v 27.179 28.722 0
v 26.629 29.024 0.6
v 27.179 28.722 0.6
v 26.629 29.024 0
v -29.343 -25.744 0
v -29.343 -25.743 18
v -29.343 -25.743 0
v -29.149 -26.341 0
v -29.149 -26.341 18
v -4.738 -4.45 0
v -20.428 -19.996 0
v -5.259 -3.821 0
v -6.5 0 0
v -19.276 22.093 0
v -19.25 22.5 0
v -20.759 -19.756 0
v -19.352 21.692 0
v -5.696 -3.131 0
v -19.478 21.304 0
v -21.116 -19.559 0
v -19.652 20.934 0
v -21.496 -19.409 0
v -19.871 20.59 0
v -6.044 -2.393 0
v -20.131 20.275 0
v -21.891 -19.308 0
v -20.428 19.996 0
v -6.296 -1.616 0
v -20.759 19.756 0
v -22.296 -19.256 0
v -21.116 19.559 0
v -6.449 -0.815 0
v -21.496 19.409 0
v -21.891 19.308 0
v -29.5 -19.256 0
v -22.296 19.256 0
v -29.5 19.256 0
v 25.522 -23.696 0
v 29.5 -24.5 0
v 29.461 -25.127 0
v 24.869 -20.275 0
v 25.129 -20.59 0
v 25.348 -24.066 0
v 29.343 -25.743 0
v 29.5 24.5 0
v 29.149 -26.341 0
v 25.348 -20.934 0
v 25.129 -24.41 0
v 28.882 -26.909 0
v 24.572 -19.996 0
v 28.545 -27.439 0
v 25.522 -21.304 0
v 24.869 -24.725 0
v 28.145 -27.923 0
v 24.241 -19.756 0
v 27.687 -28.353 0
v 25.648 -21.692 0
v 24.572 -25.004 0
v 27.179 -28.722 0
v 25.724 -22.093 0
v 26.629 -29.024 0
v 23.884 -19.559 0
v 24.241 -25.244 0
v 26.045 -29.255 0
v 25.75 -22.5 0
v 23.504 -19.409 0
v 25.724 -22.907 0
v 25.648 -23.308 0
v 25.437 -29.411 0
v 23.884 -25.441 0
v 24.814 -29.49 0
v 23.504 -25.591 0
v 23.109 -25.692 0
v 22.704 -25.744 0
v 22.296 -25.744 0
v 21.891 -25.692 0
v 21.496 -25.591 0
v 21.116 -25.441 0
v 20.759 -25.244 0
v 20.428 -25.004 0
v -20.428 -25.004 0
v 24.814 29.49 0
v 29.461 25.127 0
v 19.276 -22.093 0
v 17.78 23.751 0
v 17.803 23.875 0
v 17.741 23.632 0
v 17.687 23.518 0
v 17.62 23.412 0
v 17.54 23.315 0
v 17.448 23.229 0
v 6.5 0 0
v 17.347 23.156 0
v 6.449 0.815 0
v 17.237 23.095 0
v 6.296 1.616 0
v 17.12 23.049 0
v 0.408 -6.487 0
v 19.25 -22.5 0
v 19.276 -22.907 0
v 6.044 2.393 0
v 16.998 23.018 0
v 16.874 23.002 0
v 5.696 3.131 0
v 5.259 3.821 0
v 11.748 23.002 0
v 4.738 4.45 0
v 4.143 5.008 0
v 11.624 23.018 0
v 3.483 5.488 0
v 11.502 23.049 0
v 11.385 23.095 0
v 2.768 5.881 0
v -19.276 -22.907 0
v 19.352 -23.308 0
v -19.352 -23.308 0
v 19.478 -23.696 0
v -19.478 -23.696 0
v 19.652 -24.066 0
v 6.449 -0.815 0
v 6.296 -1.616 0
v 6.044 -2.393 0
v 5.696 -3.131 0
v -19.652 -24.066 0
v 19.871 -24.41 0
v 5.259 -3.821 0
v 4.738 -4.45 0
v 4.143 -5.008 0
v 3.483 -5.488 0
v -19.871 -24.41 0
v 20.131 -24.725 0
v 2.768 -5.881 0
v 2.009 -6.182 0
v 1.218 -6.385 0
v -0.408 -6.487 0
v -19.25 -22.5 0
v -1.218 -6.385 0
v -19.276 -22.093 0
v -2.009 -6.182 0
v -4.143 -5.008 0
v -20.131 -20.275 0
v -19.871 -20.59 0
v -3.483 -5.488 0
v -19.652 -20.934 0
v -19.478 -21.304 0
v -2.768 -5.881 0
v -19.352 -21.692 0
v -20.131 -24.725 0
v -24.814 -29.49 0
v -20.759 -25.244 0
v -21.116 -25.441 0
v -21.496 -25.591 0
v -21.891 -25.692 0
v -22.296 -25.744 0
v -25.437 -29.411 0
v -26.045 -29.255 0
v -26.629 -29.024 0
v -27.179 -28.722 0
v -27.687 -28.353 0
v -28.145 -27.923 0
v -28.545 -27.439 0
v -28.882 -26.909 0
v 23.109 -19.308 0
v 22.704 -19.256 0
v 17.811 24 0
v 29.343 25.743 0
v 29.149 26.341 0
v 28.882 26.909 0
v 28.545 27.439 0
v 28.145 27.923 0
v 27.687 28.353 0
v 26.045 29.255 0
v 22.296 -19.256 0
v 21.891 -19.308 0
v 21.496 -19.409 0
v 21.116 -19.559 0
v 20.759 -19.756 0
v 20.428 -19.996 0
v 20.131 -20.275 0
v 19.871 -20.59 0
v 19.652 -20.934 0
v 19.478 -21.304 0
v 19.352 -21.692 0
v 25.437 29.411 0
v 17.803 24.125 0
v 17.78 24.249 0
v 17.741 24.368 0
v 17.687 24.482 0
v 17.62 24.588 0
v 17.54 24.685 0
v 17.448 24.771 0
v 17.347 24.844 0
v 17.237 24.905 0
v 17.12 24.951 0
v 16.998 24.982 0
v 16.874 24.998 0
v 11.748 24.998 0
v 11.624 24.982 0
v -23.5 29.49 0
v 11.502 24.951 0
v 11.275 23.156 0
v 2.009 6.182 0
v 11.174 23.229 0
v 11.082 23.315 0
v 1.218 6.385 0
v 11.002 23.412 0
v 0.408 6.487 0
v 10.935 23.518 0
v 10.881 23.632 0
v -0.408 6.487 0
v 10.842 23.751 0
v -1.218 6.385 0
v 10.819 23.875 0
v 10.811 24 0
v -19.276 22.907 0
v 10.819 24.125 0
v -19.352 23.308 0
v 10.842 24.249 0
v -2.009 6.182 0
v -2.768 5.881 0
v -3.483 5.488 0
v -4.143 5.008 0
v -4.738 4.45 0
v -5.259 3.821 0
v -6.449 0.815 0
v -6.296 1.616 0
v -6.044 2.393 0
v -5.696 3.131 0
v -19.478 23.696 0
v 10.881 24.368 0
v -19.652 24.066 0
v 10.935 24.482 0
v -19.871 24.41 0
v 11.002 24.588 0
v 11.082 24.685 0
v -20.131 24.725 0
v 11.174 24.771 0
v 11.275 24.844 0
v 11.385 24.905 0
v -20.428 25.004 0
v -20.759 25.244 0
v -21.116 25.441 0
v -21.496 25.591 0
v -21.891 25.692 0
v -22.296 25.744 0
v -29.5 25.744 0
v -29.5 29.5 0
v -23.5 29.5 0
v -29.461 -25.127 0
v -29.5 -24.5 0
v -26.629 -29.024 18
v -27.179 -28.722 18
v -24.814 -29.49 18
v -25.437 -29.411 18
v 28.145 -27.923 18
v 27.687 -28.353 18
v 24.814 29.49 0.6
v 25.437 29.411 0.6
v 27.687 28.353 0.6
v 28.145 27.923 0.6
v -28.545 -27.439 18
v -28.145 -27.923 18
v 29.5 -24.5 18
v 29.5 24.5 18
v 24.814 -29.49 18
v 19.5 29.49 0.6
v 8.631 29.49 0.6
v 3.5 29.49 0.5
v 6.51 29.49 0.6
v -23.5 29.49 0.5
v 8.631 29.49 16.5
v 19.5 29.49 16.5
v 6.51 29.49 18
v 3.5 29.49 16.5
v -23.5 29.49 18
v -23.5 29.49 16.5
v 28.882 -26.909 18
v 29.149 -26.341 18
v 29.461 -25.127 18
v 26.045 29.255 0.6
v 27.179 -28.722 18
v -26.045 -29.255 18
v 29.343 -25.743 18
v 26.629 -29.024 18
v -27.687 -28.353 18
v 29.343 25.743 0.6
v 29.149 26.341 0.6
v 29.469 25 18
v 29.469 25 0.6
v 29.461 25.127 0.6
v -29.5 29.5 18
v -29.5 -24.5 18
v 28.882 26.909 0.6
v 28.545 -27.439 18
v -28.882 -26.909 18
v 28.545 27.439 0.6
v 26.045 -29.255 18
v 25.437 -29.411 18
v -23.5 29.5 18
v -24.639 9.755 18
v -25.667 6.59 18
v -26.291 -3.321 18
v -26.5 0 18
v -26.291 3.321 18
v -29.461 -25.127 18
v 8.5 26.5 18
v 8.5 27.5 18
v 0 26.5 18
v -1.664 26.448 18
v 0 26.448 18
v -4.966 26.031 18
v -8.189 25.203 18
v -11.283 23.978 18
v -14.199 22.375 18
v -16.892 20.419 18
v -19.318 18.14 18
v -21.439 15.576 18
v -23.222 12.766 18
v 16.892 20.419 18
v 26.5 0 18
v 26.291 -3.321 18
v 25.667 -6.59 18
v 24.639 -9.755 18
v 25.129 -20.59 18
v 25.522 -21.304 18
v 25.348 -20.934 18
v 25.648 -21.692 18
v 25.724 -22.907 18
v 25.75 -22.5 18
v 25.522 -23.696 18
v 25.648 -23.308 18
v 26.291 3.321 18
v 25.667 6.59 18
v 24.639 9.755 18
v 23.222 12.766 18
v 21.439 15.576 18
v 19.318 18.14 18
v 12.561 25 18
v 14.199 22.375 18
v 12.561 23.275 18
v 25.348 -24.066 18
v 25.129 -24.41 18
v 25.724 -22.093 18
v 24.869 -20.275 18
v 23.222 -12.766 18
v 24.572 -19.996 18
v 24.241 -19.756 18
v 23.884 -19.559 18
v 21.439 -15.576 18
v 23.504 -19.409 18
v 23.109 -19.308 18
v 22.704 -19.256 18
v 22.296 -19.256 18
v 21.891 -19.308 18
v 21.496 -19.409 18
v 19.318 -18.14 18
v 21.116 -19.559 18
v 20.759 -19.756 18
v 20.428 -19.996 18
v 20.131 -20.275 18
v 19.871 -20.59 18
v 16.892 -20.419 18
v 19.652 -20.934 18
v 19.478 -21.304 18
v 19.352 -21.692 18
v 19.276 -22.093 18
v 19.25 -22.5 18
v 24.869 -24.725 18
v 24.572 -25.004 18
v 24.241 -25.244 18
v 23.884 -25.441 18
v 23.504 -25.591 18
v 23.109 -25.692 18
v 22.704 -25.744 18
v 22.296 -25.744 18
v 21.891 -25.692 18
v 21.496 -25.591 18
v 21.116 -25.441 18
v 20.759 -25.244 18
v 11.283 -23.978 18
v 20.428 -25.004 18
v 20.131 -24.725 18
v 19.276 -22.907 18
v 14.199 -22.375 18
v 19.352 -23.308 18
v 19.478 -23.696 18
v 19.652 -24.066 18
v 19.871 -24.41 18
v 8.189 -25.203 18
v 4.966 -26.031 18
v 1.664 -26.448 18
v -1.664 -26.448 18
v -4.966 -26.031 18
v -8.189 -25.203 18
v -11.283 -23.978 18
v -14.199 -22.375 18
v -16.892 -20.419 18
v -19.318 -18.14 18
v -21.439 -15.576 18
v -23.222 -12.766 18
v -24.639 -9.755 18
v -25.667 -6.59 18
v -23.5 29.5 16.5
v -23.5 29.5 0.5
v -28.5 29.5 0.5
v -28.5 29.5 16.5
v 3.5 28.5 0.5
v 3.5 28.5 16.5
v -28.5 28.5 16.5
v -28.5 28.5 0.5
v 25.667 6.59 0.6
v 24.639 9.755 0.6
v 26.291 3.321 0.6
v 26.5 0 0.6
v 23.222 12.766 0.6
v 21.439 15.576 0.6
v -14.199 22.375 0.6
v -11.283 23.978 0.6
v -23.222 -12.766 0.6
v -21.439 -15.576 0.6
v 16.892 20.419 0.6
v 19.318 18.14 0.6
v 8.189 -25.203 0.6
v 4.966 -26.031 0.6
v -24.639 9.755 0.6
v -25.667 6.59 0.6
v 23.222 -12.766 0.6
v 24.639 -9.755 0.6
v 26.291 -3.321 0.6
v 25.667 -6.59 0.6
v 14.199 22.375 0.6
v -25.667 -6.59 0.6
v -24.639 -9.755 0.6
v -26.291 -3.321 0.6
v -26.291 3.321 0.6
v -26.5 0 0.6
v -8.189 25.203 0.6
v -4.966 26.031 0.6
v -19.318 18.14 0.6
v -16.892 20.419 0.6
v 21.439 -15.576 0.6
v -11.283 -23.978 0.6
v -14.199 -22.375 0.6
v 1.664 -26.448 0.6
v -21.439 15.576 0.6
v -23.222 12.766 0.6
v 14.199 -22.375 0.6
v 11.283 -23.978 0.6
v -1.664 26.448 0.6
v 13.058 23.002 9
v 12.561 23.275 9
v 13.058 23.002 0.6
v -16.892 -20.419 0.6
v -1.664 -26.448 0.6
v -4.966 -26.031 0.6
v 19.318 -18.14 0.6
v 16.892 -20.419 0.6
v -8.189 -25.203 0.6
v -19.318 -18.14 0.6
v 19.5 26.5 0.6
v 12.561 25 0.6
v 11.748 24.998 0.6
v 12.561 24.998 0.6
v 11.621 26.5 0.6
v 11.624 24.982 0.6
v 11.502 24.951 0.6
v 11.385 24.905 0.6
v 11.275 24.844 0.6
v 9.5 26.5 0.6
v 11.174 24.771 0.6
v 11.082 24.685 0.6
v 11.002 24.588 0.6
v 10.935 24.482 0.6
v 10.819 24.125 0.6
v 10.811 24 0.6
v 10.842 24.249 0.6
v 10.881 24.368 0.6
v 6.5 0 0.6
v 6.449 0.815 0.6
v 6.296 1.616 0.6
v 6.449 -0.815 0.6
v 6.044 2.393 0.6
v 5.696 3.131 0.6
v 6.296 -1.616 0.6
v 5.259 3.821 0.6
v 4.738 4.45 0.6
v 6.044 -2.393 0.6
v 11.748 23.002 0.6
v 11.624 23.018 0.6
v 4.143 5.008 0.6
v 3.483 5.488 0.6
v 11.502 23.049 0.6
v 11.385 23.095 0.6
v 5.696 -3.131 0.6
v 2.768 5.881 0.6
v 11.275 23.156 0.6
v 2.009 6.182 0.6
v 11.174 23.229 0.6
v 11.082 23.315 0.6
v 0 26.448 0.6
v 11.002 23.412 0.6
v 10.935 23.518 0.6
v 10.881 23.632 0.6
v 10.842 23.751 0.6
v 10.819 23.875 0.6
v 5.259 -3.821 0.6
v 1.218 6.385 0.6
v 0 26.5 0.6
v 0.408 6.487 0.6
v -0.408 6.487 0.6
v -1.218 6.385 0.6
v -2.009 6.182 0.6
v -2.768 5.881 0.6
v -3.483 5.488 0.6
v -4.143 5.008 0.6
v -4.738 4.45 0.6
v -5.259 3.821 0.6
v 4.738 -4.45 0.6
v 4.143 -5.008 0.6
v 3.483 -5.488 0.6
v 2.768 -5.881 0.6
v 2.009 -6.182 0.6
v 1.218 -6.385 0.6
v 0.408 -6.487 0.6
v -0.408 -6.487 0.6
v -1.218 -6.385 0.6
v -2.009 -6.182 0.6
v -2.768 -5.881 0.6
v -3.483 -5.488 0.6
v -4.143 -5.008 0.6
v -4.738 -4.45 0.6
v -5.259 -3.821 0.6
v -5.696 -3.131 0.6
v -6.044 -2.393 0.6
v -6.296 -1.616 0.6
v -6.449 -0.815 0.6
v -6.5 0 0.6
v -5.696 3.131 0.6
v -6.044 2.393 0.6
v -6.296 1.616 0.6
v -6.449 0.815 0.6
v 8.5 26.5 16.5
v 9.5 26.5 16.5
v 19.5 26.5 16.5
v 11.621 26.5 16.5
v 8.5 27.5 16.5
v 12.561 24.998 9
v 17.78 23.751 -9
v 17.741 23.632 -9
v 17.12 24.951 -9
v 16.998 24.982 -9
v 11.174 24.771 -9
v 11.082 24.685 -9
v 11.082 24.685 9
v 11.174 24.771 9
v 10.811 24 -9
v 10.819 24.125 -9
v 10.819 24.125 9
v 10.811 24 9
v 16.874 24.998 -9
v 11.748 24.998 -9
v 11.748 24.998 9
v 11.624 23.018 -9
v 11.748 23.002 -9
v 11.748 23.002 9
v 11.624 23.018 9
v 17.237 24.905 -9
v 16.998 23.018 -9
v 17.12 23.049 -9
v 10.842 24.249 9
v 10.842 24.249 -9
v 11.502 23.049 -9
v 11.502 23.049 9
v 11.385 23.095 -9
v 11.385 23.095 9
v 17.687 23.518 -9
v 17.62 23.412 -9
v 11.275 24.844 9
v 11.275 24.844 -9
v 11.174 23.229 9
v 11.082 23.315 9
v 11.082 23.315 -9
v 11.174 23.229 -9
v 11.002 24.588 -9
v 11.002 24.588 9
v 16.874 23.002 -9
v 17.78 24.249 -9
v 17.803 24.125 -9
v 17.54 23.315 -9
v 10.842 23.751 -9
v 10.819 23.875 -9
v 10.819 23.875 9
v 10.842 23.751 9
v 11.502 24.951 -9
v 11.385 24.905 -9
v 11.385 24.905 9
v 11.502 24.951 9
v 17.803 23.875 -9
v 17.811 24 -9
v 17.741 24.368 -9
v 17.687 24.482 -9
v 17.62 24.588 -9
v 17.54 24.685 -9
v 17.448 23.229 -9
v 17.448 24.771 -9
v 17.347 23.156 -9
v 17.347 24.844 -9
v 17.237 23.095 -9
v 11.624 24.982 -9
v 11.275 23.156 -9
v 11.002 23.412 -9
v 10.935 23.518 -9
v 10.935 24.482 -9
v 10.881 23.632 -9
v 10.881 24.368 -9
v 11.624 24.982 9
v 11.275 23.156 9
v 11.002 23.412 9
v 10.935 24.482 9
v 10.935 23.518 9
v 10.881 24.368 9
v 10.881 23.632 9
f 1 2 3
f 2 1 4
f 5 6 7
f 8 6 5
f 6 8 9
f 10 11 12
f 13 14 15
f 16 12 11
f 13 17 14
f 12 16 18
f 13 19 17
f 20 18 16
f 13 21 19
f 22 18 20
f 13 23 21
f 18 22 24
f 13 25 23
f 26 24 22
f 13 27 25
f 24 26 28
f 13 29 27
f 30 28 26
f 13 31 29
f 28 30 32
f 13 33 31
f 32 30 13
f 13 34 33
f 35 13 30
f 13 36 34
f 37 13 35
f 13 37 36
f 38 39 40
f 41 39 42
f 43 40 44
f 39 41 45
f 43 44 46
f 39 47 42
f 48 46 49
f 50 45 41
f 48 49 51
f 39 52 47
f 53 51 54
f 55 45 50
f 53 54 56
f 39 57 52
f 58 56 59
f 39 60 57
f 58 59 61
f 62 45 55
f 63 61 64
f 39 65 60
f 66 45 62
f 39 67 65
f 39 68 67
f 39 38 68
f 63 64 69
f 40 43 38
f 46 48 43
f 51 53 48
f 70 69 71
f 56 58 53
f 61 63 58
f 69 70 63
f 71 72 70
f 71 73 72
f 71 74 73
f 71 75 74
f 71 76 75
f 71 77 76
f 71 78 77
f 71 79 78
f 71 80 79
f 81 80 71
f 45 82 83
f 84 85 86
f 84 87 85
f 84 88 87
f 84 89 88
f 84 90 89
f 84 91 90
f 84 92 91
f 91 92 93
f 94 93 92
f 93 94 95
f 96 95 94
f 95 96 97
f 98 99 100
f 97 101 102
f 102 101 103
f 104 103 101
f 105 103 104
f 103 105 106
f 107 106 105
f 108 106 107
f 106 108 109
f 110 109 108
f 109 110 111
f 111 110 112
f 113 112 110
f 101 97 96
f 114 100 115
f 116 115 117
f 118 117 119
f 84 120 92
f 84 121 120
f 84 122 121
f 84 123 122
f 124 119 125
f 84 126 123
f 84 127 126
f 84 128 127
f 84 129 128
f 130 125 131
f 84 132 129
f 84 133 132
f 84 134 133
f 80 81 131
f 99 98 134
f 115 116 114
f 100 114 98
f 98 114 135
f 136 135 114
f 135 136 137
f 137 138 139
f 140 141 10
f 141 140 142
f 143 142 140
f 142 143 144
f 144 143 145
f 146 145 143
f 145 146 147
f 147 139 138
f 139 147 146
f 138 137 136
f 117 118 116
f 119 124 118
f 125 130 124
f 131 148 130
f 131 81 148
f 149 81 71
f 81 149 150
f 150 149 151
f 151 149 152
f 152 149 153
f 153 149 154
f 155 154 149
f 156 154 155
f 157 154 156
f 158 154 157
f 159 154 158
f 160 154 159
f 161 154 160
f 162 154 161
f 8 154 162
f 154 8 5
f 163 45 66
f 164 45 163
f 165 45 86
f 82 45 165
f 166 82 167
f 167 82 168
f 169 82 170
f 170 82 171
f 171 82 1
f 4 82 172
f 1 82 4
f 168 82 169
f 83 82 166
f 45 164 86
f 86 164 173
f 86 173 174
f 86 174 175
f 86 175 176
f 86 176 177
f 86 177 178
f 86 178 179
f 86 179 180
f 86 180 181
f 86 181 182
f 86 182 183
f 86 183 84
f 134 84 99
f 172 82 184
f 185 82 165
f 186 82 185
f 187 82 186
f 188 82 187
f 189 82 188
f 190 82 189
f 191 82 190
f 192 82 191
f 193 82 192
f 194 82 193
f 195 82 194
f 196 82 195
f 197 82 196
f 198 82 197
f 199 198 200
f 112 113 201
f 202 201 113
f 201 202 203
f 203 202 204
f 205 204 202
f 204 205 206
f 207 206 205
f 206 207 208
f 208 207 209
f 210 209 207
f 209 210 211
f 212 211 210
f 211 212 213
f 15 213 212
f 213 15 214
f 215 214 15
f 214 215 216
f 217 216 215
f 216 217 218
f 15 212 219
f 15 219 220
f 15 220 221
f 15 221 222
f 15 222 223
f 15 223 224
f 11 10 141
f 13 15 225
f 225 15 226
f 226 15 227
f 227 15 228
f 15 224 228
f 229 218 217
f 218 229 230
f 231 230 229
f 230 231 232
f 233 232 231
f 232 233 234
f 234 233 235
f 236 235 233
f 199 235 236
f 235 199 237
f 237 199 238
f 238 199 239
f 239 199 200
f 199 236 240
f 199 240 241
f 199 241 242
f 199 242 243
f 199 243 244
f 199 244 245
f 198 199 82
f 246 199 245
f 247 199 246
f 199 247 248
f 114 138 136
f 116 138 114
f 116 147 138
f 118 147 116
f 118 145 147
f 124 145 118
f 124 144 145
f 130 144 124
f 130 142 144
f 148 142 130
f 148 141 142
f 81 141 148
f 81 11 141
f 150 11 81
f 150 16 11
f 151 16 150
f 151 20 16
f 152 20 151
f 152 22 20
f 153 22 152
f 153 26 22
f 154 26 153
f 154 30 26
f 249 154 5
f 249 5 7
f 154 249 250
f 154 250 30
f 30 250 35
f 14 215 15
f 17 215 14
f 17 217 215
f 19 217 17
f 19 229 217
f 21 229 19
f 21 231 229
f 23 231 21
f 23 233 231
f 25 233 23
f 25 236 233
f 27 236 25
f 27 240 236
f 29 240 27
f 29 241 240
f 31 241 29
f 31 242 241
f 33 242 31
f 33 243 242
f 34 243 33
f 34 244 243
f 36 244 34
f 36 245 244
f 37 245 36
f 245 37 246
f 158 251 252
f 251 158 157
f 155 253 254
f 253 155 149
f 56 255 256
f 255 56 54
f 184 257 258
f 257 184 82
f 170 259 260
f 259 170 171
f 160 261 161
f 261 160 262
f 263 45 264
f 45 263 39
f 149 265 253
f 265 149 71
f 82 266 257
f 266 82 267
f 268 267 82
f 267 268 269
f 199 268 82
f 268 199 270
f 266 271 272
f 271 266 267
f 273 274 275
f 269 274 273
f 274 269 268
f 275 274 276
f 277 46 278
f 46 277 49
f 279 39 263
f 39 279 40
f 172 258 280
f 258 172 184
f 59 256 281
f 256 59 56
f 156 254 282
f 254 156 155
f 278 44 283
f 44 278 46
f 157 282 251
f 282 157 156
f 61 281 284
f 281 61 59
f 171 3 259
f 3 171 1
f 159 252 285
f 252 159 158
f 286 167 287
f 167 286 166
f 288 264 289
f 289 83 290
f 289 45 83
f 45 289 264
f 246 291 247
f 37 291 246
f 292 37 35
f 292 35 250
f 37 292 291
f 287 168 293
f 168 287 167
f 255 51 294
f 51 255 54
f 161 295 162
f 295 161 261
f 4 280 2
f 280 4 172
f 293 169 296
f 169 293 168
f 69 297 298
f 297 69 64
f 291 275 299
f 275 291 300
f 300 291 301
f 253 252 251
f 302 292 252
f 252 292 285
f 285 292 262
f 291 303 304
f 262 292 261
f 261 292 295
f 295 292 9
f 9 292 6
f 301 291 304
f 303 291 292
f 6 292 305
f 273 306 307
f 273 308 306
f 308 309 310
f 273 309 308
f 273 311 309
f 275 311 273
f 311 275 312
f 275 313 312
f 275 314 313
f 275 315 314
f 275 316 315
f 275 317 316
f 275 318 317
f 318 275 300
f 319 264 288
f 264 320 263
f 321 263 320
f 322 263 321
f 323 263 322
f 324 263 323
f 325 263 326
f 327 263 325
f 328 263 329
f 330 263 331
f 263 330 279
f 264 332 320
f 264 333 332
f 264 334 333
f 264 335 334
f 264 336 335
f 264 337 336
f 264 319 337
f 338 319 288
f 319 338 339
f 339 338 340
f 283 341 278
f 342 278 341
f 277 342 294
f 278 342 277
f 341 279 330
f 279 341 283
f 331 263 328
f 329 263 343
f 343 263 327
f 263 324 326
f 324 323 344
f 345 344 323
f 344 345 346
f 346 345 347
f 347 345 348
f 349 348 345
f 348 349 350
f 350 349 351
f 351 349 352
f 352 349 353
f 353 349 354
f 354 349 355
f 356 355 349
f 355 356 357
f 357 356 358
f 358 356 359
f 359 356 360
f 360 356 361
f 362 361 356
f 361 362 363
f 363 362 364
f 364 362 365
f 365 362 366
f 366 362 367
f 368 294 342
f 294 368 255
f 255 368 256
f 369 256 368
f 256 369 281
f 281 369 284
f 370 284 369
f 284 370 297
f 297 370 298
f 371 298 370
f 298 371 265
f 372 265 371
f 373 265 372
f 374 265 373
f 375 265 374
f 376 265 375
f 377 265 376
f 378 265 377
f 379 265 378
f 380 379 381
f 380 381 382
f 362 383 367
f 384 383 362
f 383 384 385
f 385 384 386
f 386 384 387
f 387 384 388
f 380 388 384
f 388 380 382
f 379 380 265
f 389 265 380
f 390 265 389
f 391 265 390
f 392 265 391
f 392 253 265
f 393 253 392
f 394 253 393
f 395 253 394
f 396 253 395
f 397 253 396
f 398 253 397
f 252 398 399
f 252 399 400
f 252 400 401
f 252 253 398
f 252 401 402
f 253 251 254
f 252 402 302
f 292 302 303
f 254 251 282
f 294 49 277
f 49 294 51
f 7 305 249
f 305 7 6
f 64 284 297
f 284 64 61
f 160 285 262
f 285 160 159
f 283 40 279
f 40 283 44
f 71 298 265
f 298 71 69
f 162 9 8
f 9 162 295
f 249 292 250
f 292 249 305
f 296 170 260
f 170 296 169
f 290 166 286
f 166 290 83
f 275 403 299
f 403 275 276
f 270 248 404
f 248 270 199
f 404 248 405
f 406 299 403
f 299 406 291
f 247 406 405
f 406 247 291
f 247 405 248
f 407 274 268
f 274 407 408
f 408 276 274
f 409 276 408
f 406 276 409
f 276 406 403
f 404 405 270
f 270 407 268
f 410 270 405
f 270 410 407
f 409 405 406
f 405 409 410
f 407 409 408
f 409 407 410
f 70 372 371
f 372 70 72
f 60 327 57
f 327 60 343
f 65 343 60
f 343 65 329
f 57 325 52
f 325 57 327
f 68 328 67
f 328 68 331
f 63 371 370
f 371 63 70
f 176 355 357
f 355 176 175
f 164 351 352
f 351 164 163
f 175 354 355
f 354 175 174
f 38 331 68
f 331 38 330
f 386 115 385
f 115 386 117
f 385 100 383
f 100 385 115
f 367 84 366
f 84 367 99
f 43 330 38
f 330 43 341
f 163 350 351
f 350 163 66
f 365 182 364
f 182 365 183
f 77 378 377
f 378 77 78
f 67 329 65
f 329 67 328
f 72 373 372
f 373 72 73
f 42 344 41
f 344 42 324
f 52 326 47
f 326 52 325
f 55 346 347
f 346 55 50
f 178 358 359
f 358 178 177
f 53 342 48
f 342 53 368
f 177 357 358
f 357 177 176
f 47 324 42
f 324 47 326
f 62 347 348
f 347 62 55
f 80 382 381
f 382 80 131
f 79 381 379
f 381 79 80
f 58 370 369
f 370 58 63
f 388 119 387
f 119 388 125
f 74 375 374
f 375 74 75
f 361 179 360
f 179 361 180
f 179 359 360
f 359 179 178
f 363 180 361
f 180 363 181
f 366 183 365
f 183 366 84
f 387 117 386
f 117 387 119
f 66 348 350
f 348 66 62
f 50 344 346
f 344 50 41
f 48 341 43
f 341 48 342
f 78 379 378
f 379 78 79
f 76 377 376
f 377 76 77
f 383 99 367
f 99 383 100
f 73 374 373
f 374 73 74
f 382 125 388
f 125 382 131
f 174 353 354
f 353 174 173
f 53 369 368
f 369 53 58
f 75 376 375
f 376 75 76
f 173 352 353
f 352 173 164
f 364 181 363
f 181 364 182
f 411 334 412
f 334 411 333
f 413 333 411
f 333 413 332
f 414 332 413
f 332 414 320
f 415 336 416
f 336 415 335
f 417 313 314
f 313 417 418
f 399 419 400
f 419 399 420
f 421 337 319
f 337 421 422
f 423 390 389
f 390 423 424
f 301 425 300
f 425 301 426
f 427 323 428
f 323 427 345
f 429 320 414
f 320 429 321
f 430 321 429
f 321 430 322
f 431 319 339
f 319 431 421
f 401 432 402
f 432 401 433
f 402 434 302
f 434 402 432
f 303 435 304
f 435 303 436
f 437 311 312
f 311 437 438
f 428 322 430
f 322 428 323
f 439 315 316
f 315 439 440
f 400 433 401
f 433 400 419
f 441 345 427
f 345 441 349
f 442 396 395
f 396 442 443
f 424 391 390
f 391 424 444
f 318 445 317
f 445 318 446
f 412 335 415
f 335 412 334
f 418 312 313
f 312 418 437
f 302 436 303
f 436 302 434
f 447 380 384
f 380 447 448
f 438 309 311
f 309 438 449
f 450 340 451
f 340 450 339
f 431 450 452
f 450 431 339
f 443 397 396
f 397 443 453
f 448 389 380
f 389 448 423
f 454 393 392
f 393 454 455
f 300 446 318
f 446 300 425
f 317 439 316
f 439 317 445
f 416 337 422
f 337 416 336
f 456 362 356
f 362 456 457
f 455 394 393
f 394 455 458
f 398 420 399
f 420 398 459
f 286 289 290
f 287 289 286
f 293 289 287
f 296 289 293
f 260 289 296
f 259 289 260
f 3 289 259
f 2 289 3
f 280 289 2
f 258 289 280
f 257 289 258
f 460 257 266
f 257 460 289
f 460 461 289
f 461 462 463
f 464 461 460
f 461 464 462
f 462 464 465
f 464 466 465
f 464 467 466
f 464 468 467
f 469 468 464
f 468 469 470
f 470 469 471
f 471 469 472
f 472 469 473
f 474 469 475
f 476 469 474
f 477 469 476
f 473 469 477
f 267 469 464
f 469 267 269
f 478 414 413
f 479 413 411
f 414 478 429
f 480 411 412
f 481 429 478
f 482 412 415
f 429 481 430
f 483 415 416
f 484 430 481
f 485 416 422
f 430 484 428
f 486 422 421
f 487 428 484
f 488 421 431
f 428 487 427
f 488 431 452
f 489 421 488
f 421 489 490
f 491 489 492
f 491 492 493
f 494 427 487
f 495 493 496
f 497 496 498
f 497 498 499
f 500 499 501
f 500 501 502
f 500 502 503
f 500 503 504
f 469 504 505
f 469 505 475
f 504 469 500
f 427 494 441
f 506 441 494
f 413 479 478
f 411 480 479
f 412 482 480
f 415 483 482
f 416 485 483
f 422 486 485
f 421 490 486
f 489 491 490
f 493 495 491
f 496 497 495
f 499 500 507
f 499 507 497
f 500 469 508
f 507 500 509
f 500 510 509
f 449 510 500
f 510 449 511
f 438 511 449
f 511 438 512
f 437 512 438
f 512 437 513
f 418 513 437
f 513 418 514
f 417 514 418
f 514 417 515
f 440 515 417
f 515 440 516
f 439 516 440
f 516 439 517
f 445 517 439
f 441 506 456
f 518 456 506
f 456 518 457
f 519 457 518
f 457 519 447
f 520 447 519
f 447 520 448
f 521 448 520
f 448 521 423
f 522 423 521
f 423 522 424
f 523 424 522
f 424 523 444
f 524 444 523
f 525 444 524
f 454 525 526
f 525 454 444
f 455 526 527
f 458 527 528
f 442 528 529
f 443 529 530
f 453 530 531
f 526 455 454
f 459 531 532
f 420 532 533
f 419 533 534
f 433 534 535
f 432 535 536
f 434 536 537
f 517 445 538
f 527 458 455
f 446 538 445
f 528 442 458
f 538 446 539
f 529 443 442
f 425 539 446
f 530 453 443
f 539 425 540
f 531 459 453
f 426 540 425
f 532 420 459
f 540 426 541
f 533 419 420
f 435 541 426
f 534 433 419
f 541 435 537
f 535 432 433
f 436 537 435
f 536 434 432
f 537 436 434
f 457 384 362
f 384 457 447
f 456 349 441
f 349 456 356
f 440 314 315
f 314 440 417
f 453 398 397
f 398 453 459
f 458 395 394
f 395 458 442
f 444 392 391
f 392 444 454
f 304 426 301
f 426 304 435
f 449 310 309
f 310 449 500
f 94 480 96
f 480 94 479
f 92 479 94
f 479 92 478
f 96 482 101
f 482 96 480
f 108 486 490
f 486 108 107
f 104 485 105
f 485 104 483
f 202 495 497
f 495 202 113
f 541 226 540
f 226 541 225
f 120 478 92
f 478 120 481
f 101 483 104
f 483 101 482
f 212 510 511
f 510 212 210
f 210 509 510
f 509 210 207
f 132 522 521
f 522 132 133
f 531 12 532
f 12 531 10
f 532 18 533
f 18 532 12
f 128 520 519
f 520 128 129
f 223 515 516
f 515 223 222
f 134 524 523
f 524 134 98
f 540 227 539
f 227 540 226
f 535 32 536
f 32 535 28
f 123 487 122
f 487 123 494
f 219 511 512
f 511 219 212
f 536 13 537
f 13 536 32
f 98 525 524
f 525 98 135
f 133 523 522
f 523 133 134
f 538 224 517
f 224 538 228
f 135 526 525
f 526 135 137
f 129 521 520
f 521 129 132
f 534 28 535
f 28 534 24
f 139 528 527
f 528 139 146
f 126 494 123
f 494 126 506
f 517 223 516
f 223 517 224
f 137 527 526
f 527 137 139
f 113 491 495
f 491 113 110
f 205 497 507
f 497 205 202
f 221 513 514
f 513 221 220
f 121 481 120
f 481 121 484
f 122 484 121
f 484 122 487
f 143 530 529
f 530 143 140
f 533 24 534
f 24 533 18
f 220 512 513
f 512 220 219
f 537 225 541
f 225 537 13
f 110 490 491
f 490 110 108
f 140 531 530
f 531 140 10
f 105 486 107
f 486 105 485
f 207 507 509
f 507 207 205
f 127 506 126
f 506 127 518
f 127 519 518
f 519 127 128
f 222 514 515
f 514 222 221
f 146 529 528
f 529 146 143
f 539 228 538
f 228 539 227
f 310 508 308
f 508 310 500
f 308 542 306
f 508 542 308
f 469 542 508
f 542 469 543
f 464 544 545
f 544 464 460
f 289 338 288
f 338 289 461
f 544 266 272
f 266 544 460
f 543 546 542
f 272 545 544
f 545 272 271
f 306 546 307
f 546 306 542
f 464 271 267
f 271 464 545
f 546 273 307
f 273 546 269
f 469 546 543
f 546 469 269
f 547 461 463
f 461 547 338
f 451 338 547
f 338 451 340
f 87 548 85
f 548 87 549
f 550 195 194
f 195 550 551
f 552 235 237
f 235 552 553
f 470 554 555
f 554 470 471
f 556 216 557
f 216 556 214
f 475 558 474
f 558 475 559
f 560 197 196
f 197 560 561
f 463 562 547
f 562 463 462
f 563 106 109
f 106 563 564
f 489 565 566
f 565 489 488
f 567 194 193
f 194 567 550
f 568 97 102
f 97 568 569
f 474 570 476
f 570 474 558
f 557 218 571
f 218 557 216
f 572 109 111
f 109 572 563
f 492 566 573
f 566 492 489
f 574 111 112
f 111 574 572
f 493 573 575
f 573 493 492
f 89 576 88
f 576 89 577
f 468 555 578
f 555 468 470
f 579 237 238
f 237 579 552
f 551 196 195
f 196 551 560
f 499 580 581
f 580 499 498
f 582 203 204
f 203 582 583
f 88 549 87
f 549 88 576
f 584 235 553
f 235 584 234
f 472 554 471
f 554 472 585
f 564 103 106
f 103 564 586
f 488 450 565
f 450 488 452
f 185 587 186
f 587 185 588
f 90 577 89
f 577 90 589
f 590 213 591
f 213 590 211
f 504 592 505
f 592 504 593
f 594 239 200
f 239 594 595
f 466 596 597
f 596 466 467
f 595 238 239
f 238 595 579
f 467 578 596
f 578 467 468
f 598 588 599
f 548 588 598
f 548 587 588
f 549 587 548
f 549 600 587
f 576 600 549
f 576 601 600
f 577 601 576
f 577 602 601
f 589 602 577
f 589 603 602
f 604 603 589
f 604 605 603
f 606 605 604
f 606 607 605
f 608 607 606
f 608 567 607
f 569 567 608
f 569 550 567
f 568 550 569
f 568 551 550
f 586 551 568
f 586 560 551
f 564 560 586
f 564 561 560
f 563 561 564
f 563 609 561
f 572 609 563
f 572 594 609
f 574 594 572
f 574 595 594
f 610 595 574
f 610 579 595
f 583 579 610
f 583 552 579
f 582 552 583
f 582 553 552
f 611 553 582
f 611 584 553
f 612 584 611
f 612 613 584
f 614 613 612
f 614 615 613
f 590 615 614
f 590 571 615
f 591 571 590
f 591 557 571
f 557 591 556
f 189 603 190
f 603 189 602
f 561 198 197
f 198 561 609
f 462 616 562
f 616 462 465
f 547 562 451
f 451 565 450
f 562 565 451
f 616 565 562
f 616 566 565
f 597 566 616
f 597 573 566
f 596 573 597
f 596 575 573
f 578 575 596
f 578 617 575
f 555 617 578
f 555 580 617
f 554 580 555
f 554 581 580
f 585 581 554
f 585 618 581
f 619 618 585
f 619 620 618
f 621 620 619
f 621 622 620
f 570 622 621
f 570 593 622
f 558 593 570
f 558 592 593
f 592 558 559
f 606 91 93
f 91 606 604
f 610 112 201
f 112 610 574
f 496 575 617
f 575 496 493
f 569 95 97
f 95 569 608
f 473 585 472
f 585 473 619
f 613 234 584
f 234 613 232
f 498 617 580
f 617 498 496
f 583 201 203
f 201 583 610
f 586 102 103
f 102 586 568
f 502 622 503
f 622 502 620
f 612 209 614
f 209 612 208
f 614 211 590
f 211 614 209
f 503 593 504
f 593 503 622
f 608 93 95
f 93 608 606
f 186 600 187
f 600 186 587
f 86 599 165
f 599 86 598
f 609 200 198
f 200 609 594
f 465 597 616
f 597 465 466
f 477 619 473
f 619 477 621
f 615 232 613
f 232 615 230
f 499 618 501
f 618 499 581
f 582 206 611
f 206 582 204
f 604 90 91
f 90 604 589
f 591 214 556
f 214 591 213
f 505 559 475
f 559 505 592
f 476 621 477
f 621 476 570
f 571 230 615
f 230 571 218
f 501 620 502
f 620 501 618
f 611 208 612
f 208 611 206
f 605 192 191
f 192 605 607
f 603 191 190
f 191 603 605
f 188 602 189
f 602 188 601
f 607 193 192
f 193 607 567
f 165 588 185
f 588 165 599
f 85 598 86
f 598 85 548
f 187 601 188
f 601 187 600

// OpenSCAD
$fn = 50;


union() {
	difference() {
		union() {
			hull() {
				translate(v = [-24.5000000000, 24.5000000000, 0]) {
					cylinder(h = 18, r = 5);
				}
				translate(v = [24.5000000000, 24.5000000000, 0]) {
					cylinder(h = 18, r = 5);
				}
				translate(v = [-24.5000000000, -24.5000000000, 0]) {
					cylinder(h = 18, r = 5);
				}
				translate(v = [24.5000000000, -24.5000000000, 0]) {
					cylinder(h = 18, r = 5);
				}
			}
			translate(v = [-29.5000000000, 23.5000000000, 0]) {
				cube(size = [6, 6, 18]);
			}
		}
		union() {
			translate(v = [-30.0000000000, -22.5000000000, -250.0000000000]) {
				rotate(a = [0, 0, 0]) {
					difference() {
						union() {
							hull() {
								translate(v = [7.5000000000, 0, 0]) {
									cylinder(h = 250, r = 3.2500000000, r1 = 3.2500000000, r2 = 3.2500000000);
								}
								translate(v = [-7.5000000000, 0, 0]) {
									cylinder(h = 250, r = 3.2500000000, r1 = 3.2500000000, r2 = 3.2500000000);
								}
							}
						}
						union();
					}
				}
			}
			translate(v = [-30.0000000000, 22.5000000000, -250.0000000000]) {
				rotate(a = [0, 0, 0]) {
					difference() {
						union() {
							hull() {
								translate(v = [7.5000000000, 0, 0]) {
									cylinder(h = 250, r = 3.2500000000, r1 = 3.2500000000, r2 = 3.2500000000);
								}
								translate(v = [-7.5000000000, 0, 0]) {
									cylinder(h = 250, r = 3.2500000000, r1 = 3.2500000000, r2 = 3.2500000000);
								}
							}
						}
						union();
					}
				}
			}
			translate(v = [-28.5000000000, 28.5000000000, 0.5000000000]) {
				cube(size = [32, 1, 16]);
			}
			translate(v = [22.5000000000, -22.5000000000, 0]) {
				cylinder(h = 100, r = 3.2500000000);
			}
			translate(v = [0, 0, 0.6000000000]) {
				cylinder(h = 20.4000000000, r = 26.5000000000);
			}
			translate(v = [0, 0, -9.0000000000]) {
				cylinder(h = 18, r = 6.5000000000);
			}
			translate(v = [0.0000000000, 25.0000000000, 0.6000000000]) {
				cube(size = [29.5000000000, 1.5000000000, 20.4000000000]);
			}
			translate(v = [19.5000000000, 25.0000000000, 0.6000000000]) {
				cube(size = [10, 4.5000000000, 20.4000000000]);
			}
			translate(v = [8.5000000000, 25.0000000000, 16.5000000000]) {
				cube(size = [21, 4.5000000000, 1.5000000000]);
			}
			translate(v = [5.7500000000, 30.2500000000, 0.6000000000]) {
				rotate(a = [0, 0, -45]) {
					cube(size = [7.5000000000, 1.5000000000, 20.4000000000]);
				}
			}
			translate(v = [5.0610000000, 23.0000000000, 0.6000000000]) {
				cube(size = [7.5000000000, 2, 17.4000000000]);
			}
		}
	}
	union() {
		translate(v = [14.3110000000, 24.0000000000, -9.0000000000]) {
			rotate(a = [0, 0, 0]) {
				difference() {
					union() {
						#hull() {
							#translate(v = [2.5000000000, 0, 0]) {
								cylinder(h = 18, r = 1.0000000000, r1 = 1.0000000000, r2 = 1.0000000000);
							}
							#translate(v = [-2.5000000000, 0, 0]) {
								cylinder(h = 18, r = 1.0000000000, r1 = 1.0000000000, r2 = 1.0000000000);
							}
						}
					}
					union();
				}
			}
		}
	}
}
